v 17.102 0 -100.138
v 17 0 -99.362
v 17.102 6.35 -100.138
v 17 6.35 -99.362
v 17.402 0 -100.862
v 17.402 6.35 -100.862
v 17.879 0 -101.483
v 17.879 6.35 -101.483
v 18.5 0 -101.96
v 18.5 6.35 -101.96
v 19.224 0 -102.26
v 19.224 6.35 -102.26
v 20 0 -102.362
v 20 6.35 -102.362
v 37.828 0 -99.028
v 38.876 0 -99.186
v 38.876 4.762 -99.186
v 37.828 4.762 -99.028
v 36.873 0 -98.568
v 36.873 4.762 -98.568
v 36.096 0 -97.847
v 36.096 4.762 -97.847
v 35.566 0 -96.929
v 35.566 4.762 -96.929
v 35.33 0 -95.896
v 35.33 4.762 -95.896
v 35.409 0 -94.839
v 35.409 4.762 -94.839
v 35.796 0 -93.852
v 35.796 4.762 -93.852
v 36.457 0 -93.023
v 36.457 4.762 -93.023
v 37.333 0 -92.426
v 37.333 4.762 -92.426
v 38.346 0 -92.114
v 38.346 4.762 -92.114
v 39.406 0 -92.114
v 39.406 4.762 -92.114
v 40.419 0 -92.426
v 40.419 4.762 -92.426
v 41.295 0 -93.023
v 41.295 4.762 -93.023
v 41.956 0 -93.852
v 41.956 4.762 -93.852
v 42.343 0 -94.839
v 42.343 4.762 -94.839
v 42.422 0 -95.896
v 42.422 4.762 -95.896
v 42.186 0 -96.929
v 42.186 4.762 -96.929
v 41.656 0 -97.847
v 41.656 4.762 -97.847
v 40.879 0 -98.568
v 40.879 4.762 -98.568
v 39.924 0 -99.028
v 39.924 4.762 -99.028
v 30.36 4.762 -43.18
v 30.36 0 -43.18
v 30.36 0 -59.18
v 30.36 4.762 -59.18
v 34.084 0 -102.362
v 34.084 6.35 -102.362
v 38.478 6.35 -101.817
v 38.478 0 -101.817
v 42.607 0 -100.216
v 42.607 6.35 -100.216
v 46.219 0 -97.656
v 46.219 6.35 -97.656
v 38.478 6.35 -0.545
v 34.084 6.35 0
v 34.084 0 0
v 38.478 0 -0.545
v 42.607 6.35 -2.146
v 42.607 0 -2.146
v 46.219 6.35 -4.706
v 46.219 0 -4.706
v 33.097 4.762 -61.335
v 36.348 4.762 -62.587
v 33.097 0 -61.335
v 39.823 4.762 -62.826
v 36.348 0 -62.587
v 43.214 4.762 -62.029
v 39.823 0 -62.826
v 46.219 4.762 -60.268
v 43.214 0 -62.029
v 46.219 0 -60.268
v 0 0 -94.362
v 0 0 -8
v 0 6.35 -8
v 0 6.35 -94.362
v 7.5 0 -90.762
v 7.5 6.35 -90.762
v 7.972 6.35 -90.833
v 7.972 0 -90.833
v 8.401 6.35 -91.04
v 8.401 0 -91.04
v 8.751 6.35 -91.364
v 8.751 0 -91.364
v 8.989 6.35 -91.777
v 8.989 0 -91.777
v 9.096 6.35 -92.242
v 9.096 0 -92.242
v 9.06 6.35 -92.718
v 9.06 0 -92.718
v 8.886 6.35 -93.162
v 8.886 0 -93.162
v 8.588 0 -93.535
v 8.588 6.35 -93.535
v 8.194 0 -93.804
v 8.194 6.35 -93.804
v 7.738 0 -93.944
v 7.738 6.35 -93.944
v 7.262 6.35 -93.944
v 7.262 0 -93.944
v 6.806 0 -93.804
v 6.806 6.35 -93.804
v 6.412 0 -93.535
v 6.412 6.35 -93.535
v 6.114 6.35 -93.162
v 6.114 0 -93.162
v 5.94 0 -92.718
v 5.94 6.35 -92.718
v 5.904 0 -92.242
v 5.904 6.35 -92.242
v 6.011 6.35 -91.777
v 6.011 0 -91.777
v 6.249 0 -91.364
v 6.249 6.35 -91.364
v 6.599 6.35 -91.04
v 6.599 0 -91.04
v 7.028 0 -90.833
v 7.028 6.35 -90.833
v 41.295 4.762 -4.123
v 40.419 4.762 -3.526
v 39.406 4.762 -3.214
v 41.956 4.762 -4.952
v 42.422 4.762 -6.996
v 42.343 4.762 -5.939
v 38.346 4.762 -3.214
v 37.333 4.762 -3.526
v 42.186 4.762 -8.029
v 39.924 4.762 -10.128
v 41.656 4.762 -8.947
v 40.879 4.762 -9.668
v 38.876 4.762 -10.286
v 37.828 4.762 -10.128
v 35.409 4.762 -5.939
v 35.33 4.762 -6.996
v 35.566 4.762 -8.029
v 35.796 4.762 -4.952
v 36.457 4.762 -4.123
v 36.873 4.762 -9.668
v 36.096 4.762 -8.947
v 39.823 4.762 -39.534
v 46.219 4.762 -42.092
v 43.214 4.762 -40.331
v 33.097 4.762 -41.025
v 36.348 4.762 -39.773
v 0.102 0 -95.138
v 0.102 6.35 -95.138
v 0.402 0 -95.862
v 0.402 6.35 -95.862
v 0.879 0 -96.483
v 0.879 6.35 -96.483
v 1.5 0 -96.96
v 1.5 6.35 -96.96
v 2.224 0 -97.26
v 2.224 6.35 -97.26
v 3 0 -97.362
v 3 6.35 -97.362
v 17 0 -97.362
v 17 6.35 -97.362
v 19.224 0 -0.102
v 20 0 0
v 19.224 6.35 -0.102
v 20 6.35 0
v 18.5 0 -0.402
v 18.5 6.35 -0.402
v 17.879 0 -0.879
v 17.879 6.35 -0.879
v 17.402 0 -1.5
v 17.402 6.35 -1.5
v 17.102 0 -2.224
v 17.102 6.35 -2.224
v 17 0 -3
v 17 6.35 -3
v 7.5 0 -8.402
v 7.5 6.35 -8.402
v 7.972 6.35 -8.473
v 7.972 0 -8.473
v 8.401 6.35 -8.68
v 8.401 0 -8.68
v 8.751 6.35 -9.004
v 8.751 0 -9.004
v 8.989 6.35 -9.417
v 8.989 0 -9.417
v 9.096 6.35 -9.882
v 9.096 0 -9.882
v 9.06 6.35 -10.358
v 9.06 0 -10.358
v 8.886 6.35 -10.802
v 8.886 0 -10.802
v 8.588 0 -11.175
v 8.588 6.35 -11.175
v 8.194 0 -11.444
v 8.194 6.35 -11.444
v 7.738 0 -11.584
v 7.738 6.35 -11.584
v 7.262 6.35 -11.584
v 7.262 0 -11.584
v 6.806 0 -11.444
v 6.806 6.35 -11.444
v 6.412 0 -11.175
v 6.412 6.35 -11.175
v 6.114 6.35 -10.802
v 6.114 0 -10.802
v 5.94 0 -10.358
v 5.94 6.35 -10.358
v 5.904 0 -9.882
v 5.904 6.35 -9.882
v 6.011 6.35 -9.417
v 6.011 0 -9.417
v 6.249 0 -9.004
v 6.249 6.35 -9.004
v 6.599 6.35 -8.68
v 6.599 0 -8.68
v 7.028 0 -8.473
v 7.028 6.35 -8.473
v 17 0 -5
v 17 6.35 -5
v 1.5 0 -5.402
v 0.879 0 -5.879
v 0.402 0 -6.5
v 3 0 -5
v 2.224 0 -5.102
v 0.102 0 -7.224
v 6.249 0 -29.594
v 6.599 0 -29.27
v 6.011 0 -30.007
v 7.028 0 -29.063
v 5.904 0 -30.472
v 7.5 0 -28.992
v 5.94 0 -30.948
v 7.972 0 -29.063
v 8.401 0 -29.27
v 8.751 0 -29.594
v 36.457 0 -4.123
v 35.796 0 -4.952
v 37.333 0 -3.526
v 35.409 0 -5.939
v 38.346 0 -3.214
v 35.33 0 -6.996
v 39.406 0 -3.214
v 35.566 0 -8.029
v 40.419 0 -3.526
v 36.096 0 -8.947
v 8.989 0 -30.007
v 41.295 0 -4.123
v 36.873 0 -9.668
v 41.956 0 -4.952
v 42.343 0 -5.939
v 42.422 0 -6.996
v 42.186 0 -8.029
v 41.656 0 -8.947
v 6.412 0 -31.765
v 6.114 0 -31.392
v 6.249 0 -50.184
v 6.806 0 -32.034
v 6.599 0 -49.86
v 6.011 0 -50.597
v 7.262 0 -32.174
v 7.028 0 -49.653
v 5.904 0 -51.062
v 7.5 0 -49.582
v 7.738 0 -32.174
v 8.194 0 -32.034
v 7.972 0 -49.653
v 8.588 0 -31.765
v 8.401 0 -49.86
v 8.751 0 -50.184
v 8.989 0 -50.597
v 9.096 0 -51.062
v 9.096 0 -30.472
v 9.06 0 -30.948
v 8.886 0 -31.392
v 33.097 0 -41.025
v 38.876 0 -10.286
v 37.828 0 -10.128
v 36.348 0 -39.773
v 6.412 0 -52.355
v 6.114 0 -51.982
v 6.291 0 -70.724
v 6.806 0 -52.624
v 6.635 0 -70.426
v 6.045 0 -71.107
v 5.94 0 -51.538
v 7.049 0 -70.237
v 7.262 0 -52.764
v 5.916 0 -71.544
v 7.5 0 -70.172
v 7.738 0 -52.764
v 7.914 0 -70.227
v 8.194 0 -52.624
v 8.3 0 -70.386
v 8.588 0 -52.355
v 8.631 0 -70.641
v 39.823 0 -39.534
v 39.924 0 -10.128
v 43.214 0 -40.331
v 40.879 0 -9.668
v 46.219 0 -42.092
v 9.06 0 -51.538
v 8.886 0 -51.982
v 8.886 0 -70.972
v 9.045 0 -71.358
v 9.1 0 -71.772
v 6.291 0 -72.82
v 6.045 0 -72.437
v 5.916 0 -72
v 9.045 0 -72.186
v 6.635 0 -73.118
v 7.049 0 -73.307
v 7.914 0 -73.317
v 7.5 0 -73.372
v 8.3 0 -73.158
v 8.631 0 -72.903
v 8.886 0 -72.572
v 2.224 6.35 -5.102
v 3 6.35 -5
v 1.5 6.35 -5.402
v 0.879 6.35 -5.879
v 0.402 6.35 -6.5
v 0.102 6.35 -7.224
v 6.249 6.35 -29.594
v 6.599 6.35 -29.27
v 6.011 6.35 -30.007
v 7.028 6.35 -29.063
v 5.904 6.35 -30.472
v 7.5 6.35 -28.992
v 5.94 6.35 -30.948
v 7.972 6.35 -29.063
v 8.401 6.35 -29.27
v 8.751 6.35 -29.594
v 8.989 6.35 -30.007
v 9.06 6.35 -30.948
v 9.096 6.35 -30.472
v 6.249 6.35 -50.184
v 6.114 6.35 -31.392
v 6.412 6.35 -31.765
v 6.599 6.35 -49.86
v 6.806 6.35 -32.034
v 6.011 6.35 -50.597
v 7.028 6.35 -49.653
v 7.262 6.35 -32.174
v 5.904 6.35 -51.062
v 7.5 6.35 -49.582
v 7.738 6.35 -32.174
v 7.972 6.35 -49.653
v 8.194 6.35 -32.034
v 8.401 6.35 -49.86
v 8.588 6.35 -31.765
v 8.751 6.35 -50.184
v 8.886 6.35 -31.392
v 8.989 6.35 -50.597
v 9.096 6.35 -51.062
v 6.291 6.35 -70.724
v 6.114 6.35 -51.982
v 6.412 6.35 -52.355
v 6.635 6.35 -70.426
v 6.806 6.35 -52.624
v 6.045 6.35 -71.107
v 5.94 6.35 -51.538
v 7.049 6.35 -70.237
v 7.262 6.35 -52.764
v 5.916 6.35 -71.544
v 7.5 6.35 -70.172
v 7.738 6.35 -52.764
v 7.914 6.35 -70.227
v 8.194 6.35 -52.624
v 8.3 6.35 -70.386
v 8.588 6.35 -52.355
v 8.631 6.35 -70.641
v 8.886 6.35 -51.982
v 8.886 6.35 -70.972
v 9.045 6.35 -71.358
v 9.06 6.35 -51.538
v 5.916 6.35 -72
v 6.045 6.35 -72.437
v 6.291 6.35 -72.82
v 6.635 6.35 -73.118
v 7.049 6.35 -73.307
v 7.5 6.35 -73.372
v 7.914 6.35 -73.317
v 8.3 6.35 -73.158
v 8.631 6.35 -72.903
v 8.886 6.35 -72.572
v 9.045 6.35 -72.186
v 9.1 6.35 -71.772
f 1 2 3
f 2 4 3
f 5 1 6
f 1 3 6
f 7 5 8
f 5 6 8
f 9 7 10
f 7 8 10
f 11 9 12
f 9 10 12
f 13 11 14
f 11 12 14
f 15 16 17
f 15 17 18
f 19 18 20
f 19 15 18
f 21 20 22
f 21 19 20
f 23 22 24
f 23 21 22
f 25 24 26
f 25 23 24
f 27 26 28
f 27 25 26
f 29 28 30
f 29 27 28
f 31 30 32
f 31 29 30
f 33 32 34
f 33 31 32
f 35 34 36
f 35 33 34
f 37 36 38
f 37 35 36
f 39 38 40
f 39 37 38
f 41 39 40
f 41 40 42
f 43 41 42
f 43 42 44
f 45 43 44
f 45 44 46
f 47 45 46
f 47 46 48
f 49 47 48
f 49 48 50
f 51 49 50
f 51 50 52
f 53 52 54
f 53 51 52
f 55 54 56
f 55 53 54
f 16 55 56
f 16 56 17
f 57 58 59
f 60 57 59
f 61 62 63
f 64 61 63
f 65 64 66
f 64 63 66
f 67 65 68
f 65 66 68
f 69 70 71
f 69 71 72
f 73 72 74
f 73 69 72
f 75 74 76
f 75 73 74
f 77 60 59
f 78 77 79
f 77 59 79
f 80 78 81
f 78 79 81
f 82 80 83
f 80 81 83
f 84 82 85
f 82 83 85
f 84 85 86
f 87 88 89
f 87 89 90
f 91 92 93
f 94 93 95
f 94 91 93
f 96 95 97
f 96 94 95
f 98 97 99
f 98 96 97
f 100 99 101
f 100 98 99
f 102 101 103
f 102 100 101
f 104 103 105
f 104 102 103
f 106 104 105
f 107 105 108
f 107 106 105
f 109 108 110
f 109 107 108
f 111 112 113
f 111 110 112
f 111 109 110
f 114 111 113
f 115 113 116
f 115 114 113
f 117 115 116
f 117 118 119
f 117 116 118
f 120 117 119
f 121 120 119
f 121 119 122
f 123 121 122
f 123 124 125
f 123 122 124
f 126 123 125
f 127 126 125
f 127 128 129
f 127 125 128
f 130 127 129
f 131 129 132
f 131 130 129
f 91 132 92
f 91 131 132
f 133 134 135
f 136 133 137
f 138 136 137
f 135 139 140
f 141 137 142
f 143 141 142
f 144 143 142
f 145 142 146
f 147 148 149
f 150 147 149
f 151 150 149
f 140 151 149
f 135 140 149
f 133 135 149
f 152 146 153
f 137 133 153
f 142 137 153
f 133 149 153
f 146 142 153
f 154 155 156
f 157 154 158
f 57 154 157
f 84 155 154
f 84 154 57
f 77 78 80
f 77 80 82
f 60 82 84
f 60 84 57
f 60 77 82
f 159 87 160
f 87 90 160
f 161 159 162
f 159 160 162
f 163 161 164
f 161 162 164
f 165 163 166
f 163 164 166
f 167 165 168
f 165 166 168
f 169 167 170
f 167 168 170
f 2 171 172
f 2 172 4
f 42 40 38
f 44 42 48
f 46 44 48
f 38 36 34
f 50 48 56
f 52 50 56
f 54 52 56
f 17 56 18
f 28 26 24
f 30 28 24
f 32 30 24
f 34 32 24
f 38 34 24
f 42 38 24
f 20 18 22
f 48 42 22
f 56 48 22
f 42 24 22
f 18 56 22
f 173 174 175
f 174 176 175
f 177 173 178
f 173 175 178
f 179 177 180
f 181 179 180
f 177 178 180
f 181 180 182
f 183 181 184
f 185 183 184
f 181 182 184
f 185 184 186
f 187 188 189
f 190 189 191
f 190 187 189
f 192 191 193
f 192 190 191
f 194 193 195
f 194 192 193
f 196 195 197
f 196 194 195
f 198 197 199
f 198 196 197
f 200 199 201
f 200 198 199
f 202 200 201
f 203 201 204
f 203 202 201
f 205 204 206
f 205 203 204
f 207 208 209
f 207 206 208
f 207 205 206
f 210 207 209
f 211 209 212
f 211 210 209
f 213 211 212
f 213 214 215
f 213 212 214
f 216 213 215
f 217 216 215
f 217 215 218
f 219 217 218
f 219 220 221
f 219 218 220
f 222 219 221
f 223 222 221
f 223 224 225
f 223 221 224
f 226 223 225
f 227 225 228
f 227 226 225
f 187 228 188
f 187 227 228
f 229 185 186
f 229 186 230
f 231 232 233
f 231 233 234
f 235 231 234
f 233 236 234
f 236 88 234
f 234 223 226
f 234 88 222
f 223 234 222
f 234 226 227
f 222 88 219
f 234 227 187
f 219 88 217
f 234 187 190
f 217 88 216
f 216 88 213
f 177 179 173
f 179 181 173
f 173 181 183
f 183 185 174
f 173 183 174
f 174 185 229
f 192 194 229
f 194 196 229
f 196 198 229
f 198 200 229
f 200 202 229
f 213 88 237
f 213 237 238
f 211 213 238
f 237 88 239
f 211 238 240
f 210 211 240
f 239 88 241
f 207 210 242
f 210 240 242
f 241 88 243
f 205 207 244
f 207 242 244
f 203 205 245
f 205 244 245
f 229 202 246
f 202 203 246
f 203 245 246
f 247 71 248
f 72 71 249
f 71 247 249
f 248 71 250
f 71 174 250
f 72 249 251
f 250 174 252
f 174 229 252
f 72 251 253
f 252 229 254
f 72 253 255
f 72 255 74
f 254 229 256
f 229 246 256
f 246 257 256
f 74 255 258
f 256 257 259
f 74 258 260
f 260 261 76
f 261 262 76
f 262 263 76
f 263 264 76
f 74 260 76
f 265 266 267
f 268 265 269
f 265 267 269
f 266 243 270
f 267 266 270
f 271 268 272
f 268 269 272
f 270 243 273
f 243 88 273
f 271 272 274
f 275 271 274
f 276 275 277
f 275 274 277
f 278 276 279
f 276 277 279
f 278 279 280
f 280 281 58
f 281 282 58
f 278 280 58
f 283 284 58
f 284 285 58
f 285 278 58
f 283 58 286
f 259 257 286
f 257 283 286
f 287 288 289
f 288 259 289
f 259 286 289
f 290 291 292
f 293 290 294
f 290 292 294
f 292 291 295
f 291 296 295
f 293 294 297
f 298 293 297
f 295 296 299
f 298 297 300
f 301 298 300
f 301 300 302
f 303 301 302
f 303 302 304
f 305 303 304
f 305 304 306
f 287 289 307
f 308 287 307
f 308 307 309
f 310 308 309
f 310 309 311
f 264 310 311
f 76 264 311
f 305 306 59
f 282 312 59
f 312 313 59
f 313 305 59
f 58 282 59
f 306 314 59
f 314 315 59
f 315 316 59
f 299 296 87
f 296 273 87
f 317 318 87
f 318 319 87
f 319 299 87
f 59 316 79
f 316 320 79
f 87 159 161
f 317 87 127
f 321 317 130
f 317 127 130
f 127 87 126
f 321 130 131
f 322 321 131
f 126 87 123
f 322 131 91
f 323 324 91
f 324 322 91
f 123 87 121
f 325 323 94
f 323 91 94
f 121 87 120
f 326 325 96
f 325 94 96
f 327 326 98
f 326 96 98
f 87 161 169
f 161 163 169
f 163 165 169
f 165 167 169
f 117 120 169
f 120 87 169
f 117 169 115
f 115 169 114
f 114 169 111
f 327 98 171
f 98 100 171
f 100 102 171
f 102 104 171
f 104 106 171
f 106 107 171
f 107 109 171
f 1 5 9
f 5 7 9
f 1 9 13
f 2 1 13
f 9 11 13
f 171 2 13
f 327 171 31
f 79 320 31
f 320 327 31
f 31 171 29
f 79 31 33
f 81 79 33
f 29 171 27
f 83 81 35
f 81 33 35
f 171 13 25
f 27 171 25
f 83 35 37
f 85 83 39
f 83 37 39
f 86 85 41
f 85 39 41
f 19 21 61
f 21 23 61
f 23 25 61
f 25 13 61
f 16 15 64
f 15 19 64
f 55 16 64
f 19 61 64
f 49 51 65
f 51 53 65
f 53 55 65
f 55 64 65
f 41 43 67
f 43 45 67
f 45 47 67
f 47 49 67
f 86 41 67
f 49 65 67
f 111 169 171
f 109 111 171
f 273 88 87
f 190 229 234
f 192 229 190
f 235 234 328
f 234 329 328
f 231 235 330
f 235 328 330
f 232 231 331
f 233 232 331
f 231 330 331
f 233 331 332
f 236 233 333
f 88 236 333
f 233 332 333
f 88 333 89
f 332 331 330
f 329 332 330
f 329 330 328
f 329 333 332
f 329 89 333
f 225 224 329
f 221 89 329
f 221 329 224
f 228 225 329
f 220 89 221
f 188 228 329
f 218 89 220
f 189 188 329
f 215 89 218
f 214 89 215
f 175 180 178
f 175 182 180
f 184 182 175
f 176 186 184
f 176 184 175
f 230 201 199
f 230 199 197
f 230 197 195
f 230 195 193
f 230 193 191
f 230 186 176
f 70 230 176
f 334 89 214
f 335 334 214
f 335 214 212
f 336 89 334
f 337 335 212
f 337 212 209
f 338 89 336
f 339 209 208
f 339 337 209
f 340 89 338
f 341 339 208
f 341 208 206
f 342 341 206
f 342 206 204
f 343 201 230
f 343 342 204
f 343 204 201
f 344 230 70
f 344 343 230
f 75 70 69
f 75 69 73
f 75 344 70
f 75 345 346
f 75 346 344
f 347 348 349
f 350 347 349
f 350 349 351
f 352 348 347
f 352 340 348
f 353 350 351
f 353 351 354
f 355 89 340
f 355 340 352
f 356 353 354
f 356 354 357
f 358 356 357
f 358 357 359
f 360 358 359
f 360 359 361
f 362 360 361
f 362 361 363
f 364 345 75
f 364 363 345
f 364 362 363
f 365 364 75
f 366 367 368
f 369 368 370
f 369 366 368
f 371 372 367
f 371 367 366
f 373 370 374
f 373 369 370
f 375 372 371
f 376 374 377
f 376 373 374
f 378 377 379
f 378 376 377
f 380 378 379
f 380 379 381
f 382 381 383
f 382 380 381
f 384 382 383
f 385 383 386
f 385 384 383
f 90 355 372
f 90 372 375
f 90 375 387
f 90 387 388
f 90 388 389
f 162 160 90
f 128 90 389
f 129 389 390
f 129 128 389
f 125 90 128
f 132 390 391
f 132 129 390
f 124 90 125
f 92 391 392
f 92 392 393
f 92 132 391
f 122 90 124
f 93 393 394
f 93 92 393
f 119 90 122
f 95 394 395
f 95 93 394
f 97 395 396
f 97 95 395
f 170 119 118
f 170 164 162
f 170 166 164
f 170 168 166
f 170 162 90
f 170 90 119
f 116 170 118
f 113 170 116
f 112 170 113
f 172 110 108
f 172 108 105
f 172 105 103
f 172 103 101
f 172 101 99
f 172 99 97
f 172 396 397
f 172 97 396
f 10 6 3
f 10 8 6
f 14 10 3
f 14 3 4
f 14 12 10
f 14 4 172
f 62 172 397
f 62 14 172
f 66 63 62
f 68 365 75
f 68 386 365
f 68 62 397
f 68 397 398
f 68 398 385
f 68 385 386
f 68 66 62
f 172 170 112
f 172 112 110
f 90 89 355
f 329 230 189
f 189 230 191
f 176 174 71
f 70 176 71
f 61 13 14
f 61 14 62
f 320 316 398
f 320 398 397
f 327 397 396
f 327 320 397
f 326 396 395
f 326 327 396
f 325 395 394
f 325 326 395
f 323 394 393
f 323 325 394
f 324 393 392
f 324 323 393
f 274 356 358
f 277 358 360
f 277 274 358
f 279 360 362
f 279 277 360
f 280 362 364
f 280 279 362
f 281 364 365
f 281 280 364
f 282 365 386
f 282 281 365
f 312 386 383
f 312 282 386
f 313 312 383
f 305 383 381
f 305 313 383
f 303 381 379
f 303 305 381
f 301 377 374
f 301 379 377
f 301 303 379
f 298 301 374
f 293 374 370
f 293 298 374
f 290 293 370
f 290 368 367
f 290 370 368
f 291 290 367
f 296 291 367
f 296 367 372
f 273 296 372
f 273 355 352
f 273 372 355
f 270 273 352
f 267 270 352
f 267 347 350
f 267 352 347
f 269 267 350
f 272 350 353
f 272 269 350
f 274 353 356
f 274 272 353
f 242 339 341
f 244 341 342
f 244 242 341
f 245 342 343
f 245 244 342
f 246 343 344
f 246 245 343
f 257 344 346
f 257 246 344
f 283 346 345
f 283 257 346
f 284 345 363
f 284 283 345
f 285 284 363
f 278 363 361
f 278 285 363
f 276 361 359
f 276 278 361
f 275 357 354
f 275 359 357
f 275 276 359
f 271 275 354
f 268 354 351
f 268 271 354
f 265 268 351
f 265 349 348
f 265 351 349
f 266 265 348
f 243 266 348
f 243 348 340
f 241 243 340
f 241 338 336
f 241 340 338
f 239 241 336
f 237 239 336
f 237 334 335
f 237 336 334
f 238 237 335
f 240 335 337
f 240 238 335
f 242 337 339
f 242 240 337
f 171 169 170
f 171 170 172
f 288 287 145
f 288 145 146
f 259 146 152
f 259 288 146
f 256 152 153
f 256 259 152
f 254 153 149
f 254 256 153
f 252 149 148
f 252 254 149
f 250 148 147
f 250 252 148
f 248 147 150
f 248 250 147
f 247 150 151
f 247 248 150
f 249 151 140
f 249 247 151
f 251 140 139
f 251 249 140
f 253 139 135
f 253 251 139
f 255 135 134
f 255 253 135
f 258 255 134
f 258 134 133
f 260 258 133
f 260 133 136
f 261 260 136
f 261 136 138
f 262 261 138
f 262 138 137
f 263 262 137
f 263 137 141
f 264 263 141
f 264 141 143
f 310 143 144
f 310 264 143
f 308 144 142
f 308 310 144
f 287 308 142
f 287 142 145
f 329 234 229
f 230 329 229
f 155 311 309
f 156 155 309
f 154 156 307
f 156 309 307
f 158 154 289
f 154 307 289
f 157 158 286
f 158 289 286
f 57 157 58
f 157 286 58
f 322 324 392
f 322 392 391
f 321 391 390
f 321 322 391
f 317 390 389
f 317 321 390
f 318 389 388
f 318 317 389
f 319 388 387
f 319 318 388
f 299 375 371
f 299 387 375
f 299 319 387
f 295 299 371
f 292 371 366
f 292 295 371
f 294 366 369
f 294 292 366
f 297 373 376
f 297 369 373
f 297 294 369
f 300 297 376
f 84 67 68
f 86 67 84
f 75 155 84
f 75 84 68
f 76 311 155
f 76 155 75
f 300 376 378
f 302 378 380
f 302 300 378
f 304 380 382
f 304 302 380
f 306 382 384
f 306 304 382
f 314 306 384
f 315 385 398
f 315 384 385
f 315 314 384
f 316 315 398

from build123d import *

# Parameters (mm, degrees)
SKETCH1_W           = 52.084
SKETCH1_H           = 102.362
BOSS_EXTRUDE1_DEPTH = 6.35
SKETCH1_4_R         = 1.6
CUT_EXTRUDE2_DEPTH  = 116.026277867
SKETCH1_5_R         = 3.556
CUT_EXTRUDE3_DEPTH  = 4.7625
FILLET1_R           = 18
SKETCH1_7_W         = 17
SKETCH1_7_H         = 5
CUT_EXTRUDE4_DEPTH  = 116.026277867
FILLET4_R           = 3
SKETCH3_W           = 22.451753575
SKETCH3_H           = 92.950303638
CUT_EXTRUDE6_DEPTH  = 6.35


with BuildPart() as part:
    # Sketch1 → Boss-Extrude1 (new body)
    with BuildSketch(Plane(origin=(0, 0, 0), x_dir=(1, 0, 0), z_dir=(0, 1, 0))):
        with Locations((26.042, 51.181)):
            Rectangle(SKETCH1_W, SKETCH1_H)
    extrude(amount=BOSS_EXTRUDE1_DEPTH)

    # Sketch1<4> → Cut-Extrude2 (cut, through all)
    with BuildSketch(Plane(origin=(0, 0, 0), x_dir=(1, 0, 0), z_dir=(0, 1, 0))):
        with BuildLine():
            ThreePointArc((9.1, 71.772), (8.63137085, 72.90337085), (7.5, 73.372))
            Line((7.5, 73.372), (7.5, 70.172))
            ThreePointArc((7.5, 70.172), (8.63137085, 70.64062915), (9.1, 71.772))
        make_face()
        with BuildLine():
            Line((7.5, 70.172), (7.5, 73.372))
            ThreePointArc((7.5, 73.372), (5.9, 71.772), (7.5, 70.172))
        make_face()
        with Locations(Location((7.5, 92.362, 0), (0, 0, 270))):
            Circle(SKETCH1_4_R)
        with Locations(Location((7.5, 51.182, 0), (0, 0, 270))):
            Circle(SKETCH1_4_R)
        with Locations(Location((7.5, 30.592, 0), (0, 0, 270))):
            Circle(SKETCH1_4_R)
        with Locations(Location((7.5, 10.002, 0), (0, 0, 270))):
            Circle(SKETCH1_4_R)
    extrude(amount=CUT_EXTRUDE2_DEPTH, mode=Mode.SUBTRACT)

    # Sketch1<5> → Cut-Extrude3 (cut)
    with BuildSketch(Plane(origin=(0, 0, 0), x_dir=(1, 0, 0), z_dir=(0, 1, 0))):
        with Locations(Location((38.876, 95.63, 0), (0, 0, 90))):
            Circle(SKETCH1_5_R)
        with Locations(Location((38.876, 6.73, 0), (0, 0, 90))):
            Circle(SKETCH1_5_R)
        with BuildLine():
            Line((30.360375772, 43.18), (30.360375772, 59.18))
            ThreePointArc((30.360375772, 59.18), (50.56, 51.18), (30.360375772, 43.18))
        make_face()
    extrude(amount=CUT_EXTRUDE3_DEPTH, mode=Mode.SUBTRACT)

    # Fillet1
    fillet1_edges = [part.edges().sort_by_distance(p)[0] for p in [
        (52.084, 3.175, 0),
        (52.084, 3.175, -102.362),
    ]]
    fillet(fillet1_edges, radius=FILLET1_R)

    # Sketch1<7> → Cut-Extrude4 (cut, through all)
    with BuildSketch(Plane(origin=(0, 0, 0), x_dir=(1, 0, 0), z_dir=(0, 1, 0))):
        with Locations((8.5, 2.5)):
            Rectangle(SKETCH1_7_W, SKETCH1_7_H)
        with Locations((8.5, 99.862)):
            Rectangle(SKETCH1_7_W, SKETCH1_7_H)
    extrude(amount=CUT_EXTRUDE4_DEPTH, mode=Mode.SUBTRACT)

    # Fillet4
    fillet4_edges = [part.edges().sort_by_distance(p)[0] for p in [
        (0, 3.175, -5),
        (17, 3.175, 0),
        (0, 3.175, -97.362),
        (17, 3.175, -102.362),
    ]]
    fillet(fillet4_edges, radius=FILLET4_R)

    # Sketch3 → Cut-Extrude6 (cut)
    with BuildSketch(Plane.XZ):
        with Locations((57.445177666, -51.181)):
            Rectangle(SKETCH3_W, SKETCH3_H)
    extrude(amount=-CUT_EXTRUDE6_DEPTH, mode=Mode.SUBTRACT)


solid = part.part
